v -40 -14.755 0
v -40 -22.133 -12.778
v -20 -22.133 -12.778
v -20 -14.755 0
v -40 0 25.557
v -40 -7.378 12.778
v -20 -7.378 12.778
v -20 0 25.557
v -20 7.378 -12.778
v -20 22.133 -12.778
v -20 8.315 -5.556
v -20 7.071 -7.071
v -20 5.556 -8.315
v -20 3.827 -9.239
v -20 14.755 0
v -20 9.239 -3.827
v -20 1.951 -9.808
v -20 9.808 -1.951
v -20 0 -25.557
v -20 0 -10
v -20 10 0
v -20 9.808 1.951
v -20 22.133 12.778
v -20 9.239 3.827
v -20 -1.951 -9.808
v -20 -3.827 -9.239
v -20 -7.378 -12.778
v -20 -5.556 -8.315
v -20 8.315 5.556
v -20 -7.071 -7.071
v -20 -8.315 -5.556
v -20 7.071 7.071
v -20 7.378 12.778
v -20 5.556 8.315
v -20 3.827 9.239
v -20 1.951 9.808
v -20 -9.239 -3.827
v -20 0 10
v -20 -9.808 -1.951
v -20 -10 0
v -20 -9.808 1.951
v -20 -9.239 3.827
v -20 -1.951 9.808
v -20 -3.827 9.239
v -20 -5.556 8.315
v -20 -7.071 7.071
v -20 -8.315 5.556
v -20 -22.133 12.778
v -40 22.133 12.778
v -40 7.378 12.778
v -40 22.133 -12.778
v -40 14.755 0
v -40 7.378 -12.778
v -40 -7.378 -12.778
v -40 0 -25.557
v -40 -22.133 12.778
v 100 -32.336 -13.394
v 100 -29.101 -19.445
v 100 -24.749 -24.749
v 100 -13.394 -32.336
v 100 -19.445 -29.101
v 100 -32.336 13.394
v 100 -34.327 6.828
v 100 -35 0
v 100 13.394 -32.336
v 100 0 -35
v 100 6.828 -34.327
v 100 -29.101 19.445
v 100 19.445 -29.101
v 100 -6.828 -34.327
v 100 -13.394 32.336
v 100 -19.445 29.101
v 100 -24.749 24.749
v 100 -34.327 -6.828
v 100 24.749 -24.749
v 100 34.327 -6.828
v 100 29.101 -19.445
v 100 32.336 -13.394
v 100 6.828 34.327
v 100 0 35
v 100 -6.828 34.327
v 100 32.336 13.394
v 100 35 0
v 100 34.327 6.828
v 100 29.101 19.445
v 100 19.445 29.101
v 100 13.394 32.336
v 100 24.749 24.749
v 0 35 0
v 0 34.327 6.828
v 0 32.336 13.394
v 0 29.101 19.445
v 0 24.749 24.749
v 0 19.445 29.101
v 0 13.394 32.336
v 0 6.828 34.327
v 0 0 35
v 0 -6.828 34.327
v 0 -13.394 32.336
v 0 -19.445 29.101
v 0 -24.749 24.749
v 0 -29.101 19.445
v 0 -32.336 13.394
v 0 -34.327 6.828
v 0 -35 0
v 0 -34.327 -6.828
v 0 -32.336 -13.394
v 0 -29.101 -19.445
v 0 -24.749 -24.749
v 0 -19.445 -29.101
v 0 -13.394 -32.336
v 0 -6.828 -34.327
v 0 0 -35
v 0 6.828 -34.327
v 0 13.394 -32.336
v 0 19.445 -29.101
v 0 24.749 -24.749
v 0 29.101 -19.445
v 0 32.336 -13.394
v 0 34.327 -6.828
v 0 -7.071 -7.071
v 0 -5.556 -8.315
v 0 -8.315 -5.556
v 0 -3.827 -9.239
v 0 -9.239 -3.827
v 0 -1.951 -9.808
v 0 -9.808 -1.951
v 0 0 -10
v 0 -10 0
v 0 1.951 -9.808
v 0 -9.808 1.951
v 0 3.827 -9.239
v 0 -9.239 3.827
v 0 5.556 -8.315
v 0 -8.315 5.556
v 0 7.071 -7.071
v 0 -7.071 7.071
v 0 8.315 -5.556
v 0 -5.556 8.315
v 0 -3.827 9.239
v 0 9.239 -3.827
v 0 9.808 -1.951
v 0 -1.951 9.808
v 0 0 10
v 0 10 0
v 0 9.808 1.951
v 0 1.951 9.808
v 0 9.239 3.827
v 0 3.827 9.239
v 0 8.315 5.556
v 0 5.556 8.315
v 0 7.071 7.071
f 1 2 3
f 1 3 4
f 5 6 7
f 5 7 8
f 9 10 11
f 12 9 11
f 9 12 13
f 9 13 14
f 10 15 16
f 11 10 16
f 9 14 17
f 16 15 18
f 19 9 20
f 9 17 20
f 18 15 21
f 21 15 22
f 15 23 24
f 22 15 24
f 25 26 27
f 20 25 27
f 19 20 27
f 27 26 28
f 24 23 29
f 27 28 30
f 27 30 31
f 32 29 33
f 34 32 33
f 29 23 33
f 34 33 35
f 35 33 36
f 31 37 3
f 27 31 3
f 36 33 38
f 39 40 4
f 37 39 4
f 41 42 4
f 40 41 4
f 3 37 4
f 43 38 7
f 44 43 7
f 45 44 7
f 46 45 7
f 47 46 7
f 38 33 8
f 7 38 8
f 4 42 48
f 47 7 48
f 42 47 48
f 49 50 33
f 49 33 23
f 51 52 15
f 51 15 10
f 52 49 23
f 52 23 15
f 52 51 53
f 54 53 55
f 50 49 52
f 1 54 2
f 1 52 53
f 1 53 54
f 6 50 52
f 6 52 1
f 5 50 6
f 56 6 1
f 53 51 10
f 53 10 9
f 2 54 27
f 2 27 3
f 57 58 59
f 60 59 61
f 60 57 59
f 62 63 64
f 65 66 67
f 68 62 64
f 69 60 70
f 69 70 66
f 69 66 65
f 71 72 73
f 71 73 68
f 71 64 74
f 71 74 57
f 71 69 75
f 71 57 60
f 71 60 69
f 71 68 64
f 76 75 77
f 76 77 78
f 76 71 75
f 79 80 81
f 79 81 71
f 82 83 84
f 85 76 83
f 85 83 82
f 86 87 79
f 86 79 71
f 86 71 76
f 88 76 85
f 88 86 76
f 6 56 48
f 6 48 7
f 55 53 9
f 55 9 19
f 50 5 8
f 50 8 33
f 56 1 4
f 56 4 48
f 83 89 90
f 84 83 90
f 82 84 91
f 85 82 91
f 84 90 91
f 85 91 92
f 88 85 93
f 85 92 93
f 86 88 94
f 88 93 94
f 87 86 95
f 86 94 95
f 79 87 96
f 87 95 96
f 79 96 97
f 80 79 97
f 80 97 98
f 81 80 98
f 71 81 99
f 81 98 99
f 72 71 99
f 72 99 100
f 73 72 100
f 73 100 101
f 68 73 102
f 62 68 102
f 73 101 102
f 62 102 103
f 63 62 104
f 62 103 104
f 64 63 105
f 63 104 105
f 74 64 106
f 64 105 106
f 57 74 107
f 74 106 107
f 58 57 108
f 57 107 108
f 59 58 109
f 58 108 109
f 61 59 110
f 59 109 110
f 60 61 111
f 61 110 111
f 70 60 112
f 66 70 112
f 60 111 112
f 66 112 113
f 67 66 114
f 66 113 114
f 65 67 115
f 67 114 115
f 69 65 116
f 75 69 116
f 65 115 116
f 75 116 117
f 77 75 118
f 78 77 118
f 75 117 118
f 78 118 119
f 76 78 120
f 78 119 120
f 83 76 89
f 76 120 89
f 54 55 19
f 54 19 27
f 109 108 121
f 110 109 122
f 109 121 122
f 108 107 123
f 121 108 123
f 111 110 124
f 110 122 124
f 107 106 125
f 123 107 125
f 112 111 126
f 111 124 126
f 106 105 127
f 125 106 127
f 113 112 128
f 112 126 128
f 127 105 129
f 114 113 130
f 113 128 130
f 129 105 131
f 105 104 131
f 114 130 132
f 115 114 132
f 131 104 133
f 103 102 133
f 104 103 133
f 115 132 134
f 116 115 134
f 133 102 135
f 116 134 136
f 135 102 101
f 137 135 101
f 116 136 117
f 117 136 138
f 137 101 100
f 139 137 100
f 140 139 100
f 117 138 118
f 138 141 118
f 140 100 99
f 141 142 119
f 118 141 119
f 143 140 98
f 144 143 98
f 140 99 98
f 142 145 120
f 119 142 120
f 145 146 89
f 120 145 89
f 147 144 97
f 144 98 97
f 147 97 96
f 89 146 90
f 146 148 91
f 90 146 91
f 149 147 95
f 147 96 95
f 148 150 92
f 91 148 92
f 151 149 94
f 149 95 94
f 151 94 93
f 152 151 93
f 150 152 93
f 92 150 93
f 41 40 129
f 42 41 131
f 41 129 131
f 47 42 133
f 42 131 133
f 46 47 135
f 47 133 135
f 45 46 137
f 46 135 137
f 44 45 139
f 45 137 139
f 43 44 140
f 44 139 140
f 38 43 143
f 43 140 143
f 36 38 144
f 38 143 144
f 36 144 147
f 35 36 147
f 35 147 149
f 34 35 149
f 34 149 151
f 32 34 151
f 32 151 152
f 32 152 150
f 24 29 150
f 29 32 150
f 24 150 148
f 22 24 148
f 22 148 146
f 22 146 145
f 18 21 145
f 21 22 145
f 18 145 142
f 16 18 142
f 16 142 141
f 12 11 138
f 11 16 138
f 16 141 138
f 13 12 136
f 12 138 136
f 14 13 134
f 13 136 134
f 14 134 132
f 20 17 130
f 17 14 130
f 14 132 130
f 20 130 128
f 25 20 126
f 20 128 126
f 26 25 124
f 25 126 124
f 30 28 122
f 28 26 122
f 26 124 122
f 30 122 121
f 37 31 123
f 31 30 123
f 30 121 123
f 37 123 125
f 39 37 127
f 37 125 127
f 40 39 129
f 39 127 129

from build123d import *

# Parameters (mm, degrees)
F0_R     = 35
F1_DEPTH = 100
F2_R     = 10
F3_DEPTH = 40
F5_DEPTH = 20


with BuildPart() as f1:
    # F0 (on Right) → F1 (new body)
    with BuildSketch(Plane.YZ):
        Circle(F0_R)
    extrude(amount=F1_DEPTH)

    # F2 (on face) → F3 (join)
    with BuildSketch(Plane(origin=(0, 0, 0), x_dir=(0, -1, 0), z_dir=(-1, 0, 0))):
        Circle(F2_R)
    extrude(amount=F3_DEPTH)

    # F4 (on face) → F5 (join)
    with BuildSketch(Plane(origin=(-40, 0, 0), x_dir=(0, -1, 0), z_dir=(-1, 0, 0))):
        Polygon((-7.3776064835, -12.7783892676), (0, -25.5567785352), (7.3776064835, -12.7783892676), align=None)
        Polygon((-22.1328194504, -12.7783892676), (-7.3776064835, -12.7783892676), (-14.7552129669, 0), align=None)
        Polygon((-14.7552129669, 0), (-7.3776064835, -12.7783892676), (7.3776064835, -12.7783892676), (14.7552129669, 0), (7.3776064835, 12.7783892676), (-7.3776064835, 12.7783892676), align=None)
        Polygon((14.7552129669, 0), (7.3776064835, -12.7783892676), (22.1328194504, -12.7783892676), align=None)
        Polygon((-22.1328194504, 12.7783892676), (-14.7552129669, 0), (-7.3776064835, 12.7783892676), align=None)
        Polygon((7.3776064835, 12.7783892676), (14.7552129669, 0), (22.1328194504, 12.7783892676), align=None)
        Polygon((0, 25.5567785352), (-7.3776064835, 12.7783892676), (7.3776064835, 12.7783892676), align=None)
    extrude(amount=-F5_DEPTH)


solid = f1.part
